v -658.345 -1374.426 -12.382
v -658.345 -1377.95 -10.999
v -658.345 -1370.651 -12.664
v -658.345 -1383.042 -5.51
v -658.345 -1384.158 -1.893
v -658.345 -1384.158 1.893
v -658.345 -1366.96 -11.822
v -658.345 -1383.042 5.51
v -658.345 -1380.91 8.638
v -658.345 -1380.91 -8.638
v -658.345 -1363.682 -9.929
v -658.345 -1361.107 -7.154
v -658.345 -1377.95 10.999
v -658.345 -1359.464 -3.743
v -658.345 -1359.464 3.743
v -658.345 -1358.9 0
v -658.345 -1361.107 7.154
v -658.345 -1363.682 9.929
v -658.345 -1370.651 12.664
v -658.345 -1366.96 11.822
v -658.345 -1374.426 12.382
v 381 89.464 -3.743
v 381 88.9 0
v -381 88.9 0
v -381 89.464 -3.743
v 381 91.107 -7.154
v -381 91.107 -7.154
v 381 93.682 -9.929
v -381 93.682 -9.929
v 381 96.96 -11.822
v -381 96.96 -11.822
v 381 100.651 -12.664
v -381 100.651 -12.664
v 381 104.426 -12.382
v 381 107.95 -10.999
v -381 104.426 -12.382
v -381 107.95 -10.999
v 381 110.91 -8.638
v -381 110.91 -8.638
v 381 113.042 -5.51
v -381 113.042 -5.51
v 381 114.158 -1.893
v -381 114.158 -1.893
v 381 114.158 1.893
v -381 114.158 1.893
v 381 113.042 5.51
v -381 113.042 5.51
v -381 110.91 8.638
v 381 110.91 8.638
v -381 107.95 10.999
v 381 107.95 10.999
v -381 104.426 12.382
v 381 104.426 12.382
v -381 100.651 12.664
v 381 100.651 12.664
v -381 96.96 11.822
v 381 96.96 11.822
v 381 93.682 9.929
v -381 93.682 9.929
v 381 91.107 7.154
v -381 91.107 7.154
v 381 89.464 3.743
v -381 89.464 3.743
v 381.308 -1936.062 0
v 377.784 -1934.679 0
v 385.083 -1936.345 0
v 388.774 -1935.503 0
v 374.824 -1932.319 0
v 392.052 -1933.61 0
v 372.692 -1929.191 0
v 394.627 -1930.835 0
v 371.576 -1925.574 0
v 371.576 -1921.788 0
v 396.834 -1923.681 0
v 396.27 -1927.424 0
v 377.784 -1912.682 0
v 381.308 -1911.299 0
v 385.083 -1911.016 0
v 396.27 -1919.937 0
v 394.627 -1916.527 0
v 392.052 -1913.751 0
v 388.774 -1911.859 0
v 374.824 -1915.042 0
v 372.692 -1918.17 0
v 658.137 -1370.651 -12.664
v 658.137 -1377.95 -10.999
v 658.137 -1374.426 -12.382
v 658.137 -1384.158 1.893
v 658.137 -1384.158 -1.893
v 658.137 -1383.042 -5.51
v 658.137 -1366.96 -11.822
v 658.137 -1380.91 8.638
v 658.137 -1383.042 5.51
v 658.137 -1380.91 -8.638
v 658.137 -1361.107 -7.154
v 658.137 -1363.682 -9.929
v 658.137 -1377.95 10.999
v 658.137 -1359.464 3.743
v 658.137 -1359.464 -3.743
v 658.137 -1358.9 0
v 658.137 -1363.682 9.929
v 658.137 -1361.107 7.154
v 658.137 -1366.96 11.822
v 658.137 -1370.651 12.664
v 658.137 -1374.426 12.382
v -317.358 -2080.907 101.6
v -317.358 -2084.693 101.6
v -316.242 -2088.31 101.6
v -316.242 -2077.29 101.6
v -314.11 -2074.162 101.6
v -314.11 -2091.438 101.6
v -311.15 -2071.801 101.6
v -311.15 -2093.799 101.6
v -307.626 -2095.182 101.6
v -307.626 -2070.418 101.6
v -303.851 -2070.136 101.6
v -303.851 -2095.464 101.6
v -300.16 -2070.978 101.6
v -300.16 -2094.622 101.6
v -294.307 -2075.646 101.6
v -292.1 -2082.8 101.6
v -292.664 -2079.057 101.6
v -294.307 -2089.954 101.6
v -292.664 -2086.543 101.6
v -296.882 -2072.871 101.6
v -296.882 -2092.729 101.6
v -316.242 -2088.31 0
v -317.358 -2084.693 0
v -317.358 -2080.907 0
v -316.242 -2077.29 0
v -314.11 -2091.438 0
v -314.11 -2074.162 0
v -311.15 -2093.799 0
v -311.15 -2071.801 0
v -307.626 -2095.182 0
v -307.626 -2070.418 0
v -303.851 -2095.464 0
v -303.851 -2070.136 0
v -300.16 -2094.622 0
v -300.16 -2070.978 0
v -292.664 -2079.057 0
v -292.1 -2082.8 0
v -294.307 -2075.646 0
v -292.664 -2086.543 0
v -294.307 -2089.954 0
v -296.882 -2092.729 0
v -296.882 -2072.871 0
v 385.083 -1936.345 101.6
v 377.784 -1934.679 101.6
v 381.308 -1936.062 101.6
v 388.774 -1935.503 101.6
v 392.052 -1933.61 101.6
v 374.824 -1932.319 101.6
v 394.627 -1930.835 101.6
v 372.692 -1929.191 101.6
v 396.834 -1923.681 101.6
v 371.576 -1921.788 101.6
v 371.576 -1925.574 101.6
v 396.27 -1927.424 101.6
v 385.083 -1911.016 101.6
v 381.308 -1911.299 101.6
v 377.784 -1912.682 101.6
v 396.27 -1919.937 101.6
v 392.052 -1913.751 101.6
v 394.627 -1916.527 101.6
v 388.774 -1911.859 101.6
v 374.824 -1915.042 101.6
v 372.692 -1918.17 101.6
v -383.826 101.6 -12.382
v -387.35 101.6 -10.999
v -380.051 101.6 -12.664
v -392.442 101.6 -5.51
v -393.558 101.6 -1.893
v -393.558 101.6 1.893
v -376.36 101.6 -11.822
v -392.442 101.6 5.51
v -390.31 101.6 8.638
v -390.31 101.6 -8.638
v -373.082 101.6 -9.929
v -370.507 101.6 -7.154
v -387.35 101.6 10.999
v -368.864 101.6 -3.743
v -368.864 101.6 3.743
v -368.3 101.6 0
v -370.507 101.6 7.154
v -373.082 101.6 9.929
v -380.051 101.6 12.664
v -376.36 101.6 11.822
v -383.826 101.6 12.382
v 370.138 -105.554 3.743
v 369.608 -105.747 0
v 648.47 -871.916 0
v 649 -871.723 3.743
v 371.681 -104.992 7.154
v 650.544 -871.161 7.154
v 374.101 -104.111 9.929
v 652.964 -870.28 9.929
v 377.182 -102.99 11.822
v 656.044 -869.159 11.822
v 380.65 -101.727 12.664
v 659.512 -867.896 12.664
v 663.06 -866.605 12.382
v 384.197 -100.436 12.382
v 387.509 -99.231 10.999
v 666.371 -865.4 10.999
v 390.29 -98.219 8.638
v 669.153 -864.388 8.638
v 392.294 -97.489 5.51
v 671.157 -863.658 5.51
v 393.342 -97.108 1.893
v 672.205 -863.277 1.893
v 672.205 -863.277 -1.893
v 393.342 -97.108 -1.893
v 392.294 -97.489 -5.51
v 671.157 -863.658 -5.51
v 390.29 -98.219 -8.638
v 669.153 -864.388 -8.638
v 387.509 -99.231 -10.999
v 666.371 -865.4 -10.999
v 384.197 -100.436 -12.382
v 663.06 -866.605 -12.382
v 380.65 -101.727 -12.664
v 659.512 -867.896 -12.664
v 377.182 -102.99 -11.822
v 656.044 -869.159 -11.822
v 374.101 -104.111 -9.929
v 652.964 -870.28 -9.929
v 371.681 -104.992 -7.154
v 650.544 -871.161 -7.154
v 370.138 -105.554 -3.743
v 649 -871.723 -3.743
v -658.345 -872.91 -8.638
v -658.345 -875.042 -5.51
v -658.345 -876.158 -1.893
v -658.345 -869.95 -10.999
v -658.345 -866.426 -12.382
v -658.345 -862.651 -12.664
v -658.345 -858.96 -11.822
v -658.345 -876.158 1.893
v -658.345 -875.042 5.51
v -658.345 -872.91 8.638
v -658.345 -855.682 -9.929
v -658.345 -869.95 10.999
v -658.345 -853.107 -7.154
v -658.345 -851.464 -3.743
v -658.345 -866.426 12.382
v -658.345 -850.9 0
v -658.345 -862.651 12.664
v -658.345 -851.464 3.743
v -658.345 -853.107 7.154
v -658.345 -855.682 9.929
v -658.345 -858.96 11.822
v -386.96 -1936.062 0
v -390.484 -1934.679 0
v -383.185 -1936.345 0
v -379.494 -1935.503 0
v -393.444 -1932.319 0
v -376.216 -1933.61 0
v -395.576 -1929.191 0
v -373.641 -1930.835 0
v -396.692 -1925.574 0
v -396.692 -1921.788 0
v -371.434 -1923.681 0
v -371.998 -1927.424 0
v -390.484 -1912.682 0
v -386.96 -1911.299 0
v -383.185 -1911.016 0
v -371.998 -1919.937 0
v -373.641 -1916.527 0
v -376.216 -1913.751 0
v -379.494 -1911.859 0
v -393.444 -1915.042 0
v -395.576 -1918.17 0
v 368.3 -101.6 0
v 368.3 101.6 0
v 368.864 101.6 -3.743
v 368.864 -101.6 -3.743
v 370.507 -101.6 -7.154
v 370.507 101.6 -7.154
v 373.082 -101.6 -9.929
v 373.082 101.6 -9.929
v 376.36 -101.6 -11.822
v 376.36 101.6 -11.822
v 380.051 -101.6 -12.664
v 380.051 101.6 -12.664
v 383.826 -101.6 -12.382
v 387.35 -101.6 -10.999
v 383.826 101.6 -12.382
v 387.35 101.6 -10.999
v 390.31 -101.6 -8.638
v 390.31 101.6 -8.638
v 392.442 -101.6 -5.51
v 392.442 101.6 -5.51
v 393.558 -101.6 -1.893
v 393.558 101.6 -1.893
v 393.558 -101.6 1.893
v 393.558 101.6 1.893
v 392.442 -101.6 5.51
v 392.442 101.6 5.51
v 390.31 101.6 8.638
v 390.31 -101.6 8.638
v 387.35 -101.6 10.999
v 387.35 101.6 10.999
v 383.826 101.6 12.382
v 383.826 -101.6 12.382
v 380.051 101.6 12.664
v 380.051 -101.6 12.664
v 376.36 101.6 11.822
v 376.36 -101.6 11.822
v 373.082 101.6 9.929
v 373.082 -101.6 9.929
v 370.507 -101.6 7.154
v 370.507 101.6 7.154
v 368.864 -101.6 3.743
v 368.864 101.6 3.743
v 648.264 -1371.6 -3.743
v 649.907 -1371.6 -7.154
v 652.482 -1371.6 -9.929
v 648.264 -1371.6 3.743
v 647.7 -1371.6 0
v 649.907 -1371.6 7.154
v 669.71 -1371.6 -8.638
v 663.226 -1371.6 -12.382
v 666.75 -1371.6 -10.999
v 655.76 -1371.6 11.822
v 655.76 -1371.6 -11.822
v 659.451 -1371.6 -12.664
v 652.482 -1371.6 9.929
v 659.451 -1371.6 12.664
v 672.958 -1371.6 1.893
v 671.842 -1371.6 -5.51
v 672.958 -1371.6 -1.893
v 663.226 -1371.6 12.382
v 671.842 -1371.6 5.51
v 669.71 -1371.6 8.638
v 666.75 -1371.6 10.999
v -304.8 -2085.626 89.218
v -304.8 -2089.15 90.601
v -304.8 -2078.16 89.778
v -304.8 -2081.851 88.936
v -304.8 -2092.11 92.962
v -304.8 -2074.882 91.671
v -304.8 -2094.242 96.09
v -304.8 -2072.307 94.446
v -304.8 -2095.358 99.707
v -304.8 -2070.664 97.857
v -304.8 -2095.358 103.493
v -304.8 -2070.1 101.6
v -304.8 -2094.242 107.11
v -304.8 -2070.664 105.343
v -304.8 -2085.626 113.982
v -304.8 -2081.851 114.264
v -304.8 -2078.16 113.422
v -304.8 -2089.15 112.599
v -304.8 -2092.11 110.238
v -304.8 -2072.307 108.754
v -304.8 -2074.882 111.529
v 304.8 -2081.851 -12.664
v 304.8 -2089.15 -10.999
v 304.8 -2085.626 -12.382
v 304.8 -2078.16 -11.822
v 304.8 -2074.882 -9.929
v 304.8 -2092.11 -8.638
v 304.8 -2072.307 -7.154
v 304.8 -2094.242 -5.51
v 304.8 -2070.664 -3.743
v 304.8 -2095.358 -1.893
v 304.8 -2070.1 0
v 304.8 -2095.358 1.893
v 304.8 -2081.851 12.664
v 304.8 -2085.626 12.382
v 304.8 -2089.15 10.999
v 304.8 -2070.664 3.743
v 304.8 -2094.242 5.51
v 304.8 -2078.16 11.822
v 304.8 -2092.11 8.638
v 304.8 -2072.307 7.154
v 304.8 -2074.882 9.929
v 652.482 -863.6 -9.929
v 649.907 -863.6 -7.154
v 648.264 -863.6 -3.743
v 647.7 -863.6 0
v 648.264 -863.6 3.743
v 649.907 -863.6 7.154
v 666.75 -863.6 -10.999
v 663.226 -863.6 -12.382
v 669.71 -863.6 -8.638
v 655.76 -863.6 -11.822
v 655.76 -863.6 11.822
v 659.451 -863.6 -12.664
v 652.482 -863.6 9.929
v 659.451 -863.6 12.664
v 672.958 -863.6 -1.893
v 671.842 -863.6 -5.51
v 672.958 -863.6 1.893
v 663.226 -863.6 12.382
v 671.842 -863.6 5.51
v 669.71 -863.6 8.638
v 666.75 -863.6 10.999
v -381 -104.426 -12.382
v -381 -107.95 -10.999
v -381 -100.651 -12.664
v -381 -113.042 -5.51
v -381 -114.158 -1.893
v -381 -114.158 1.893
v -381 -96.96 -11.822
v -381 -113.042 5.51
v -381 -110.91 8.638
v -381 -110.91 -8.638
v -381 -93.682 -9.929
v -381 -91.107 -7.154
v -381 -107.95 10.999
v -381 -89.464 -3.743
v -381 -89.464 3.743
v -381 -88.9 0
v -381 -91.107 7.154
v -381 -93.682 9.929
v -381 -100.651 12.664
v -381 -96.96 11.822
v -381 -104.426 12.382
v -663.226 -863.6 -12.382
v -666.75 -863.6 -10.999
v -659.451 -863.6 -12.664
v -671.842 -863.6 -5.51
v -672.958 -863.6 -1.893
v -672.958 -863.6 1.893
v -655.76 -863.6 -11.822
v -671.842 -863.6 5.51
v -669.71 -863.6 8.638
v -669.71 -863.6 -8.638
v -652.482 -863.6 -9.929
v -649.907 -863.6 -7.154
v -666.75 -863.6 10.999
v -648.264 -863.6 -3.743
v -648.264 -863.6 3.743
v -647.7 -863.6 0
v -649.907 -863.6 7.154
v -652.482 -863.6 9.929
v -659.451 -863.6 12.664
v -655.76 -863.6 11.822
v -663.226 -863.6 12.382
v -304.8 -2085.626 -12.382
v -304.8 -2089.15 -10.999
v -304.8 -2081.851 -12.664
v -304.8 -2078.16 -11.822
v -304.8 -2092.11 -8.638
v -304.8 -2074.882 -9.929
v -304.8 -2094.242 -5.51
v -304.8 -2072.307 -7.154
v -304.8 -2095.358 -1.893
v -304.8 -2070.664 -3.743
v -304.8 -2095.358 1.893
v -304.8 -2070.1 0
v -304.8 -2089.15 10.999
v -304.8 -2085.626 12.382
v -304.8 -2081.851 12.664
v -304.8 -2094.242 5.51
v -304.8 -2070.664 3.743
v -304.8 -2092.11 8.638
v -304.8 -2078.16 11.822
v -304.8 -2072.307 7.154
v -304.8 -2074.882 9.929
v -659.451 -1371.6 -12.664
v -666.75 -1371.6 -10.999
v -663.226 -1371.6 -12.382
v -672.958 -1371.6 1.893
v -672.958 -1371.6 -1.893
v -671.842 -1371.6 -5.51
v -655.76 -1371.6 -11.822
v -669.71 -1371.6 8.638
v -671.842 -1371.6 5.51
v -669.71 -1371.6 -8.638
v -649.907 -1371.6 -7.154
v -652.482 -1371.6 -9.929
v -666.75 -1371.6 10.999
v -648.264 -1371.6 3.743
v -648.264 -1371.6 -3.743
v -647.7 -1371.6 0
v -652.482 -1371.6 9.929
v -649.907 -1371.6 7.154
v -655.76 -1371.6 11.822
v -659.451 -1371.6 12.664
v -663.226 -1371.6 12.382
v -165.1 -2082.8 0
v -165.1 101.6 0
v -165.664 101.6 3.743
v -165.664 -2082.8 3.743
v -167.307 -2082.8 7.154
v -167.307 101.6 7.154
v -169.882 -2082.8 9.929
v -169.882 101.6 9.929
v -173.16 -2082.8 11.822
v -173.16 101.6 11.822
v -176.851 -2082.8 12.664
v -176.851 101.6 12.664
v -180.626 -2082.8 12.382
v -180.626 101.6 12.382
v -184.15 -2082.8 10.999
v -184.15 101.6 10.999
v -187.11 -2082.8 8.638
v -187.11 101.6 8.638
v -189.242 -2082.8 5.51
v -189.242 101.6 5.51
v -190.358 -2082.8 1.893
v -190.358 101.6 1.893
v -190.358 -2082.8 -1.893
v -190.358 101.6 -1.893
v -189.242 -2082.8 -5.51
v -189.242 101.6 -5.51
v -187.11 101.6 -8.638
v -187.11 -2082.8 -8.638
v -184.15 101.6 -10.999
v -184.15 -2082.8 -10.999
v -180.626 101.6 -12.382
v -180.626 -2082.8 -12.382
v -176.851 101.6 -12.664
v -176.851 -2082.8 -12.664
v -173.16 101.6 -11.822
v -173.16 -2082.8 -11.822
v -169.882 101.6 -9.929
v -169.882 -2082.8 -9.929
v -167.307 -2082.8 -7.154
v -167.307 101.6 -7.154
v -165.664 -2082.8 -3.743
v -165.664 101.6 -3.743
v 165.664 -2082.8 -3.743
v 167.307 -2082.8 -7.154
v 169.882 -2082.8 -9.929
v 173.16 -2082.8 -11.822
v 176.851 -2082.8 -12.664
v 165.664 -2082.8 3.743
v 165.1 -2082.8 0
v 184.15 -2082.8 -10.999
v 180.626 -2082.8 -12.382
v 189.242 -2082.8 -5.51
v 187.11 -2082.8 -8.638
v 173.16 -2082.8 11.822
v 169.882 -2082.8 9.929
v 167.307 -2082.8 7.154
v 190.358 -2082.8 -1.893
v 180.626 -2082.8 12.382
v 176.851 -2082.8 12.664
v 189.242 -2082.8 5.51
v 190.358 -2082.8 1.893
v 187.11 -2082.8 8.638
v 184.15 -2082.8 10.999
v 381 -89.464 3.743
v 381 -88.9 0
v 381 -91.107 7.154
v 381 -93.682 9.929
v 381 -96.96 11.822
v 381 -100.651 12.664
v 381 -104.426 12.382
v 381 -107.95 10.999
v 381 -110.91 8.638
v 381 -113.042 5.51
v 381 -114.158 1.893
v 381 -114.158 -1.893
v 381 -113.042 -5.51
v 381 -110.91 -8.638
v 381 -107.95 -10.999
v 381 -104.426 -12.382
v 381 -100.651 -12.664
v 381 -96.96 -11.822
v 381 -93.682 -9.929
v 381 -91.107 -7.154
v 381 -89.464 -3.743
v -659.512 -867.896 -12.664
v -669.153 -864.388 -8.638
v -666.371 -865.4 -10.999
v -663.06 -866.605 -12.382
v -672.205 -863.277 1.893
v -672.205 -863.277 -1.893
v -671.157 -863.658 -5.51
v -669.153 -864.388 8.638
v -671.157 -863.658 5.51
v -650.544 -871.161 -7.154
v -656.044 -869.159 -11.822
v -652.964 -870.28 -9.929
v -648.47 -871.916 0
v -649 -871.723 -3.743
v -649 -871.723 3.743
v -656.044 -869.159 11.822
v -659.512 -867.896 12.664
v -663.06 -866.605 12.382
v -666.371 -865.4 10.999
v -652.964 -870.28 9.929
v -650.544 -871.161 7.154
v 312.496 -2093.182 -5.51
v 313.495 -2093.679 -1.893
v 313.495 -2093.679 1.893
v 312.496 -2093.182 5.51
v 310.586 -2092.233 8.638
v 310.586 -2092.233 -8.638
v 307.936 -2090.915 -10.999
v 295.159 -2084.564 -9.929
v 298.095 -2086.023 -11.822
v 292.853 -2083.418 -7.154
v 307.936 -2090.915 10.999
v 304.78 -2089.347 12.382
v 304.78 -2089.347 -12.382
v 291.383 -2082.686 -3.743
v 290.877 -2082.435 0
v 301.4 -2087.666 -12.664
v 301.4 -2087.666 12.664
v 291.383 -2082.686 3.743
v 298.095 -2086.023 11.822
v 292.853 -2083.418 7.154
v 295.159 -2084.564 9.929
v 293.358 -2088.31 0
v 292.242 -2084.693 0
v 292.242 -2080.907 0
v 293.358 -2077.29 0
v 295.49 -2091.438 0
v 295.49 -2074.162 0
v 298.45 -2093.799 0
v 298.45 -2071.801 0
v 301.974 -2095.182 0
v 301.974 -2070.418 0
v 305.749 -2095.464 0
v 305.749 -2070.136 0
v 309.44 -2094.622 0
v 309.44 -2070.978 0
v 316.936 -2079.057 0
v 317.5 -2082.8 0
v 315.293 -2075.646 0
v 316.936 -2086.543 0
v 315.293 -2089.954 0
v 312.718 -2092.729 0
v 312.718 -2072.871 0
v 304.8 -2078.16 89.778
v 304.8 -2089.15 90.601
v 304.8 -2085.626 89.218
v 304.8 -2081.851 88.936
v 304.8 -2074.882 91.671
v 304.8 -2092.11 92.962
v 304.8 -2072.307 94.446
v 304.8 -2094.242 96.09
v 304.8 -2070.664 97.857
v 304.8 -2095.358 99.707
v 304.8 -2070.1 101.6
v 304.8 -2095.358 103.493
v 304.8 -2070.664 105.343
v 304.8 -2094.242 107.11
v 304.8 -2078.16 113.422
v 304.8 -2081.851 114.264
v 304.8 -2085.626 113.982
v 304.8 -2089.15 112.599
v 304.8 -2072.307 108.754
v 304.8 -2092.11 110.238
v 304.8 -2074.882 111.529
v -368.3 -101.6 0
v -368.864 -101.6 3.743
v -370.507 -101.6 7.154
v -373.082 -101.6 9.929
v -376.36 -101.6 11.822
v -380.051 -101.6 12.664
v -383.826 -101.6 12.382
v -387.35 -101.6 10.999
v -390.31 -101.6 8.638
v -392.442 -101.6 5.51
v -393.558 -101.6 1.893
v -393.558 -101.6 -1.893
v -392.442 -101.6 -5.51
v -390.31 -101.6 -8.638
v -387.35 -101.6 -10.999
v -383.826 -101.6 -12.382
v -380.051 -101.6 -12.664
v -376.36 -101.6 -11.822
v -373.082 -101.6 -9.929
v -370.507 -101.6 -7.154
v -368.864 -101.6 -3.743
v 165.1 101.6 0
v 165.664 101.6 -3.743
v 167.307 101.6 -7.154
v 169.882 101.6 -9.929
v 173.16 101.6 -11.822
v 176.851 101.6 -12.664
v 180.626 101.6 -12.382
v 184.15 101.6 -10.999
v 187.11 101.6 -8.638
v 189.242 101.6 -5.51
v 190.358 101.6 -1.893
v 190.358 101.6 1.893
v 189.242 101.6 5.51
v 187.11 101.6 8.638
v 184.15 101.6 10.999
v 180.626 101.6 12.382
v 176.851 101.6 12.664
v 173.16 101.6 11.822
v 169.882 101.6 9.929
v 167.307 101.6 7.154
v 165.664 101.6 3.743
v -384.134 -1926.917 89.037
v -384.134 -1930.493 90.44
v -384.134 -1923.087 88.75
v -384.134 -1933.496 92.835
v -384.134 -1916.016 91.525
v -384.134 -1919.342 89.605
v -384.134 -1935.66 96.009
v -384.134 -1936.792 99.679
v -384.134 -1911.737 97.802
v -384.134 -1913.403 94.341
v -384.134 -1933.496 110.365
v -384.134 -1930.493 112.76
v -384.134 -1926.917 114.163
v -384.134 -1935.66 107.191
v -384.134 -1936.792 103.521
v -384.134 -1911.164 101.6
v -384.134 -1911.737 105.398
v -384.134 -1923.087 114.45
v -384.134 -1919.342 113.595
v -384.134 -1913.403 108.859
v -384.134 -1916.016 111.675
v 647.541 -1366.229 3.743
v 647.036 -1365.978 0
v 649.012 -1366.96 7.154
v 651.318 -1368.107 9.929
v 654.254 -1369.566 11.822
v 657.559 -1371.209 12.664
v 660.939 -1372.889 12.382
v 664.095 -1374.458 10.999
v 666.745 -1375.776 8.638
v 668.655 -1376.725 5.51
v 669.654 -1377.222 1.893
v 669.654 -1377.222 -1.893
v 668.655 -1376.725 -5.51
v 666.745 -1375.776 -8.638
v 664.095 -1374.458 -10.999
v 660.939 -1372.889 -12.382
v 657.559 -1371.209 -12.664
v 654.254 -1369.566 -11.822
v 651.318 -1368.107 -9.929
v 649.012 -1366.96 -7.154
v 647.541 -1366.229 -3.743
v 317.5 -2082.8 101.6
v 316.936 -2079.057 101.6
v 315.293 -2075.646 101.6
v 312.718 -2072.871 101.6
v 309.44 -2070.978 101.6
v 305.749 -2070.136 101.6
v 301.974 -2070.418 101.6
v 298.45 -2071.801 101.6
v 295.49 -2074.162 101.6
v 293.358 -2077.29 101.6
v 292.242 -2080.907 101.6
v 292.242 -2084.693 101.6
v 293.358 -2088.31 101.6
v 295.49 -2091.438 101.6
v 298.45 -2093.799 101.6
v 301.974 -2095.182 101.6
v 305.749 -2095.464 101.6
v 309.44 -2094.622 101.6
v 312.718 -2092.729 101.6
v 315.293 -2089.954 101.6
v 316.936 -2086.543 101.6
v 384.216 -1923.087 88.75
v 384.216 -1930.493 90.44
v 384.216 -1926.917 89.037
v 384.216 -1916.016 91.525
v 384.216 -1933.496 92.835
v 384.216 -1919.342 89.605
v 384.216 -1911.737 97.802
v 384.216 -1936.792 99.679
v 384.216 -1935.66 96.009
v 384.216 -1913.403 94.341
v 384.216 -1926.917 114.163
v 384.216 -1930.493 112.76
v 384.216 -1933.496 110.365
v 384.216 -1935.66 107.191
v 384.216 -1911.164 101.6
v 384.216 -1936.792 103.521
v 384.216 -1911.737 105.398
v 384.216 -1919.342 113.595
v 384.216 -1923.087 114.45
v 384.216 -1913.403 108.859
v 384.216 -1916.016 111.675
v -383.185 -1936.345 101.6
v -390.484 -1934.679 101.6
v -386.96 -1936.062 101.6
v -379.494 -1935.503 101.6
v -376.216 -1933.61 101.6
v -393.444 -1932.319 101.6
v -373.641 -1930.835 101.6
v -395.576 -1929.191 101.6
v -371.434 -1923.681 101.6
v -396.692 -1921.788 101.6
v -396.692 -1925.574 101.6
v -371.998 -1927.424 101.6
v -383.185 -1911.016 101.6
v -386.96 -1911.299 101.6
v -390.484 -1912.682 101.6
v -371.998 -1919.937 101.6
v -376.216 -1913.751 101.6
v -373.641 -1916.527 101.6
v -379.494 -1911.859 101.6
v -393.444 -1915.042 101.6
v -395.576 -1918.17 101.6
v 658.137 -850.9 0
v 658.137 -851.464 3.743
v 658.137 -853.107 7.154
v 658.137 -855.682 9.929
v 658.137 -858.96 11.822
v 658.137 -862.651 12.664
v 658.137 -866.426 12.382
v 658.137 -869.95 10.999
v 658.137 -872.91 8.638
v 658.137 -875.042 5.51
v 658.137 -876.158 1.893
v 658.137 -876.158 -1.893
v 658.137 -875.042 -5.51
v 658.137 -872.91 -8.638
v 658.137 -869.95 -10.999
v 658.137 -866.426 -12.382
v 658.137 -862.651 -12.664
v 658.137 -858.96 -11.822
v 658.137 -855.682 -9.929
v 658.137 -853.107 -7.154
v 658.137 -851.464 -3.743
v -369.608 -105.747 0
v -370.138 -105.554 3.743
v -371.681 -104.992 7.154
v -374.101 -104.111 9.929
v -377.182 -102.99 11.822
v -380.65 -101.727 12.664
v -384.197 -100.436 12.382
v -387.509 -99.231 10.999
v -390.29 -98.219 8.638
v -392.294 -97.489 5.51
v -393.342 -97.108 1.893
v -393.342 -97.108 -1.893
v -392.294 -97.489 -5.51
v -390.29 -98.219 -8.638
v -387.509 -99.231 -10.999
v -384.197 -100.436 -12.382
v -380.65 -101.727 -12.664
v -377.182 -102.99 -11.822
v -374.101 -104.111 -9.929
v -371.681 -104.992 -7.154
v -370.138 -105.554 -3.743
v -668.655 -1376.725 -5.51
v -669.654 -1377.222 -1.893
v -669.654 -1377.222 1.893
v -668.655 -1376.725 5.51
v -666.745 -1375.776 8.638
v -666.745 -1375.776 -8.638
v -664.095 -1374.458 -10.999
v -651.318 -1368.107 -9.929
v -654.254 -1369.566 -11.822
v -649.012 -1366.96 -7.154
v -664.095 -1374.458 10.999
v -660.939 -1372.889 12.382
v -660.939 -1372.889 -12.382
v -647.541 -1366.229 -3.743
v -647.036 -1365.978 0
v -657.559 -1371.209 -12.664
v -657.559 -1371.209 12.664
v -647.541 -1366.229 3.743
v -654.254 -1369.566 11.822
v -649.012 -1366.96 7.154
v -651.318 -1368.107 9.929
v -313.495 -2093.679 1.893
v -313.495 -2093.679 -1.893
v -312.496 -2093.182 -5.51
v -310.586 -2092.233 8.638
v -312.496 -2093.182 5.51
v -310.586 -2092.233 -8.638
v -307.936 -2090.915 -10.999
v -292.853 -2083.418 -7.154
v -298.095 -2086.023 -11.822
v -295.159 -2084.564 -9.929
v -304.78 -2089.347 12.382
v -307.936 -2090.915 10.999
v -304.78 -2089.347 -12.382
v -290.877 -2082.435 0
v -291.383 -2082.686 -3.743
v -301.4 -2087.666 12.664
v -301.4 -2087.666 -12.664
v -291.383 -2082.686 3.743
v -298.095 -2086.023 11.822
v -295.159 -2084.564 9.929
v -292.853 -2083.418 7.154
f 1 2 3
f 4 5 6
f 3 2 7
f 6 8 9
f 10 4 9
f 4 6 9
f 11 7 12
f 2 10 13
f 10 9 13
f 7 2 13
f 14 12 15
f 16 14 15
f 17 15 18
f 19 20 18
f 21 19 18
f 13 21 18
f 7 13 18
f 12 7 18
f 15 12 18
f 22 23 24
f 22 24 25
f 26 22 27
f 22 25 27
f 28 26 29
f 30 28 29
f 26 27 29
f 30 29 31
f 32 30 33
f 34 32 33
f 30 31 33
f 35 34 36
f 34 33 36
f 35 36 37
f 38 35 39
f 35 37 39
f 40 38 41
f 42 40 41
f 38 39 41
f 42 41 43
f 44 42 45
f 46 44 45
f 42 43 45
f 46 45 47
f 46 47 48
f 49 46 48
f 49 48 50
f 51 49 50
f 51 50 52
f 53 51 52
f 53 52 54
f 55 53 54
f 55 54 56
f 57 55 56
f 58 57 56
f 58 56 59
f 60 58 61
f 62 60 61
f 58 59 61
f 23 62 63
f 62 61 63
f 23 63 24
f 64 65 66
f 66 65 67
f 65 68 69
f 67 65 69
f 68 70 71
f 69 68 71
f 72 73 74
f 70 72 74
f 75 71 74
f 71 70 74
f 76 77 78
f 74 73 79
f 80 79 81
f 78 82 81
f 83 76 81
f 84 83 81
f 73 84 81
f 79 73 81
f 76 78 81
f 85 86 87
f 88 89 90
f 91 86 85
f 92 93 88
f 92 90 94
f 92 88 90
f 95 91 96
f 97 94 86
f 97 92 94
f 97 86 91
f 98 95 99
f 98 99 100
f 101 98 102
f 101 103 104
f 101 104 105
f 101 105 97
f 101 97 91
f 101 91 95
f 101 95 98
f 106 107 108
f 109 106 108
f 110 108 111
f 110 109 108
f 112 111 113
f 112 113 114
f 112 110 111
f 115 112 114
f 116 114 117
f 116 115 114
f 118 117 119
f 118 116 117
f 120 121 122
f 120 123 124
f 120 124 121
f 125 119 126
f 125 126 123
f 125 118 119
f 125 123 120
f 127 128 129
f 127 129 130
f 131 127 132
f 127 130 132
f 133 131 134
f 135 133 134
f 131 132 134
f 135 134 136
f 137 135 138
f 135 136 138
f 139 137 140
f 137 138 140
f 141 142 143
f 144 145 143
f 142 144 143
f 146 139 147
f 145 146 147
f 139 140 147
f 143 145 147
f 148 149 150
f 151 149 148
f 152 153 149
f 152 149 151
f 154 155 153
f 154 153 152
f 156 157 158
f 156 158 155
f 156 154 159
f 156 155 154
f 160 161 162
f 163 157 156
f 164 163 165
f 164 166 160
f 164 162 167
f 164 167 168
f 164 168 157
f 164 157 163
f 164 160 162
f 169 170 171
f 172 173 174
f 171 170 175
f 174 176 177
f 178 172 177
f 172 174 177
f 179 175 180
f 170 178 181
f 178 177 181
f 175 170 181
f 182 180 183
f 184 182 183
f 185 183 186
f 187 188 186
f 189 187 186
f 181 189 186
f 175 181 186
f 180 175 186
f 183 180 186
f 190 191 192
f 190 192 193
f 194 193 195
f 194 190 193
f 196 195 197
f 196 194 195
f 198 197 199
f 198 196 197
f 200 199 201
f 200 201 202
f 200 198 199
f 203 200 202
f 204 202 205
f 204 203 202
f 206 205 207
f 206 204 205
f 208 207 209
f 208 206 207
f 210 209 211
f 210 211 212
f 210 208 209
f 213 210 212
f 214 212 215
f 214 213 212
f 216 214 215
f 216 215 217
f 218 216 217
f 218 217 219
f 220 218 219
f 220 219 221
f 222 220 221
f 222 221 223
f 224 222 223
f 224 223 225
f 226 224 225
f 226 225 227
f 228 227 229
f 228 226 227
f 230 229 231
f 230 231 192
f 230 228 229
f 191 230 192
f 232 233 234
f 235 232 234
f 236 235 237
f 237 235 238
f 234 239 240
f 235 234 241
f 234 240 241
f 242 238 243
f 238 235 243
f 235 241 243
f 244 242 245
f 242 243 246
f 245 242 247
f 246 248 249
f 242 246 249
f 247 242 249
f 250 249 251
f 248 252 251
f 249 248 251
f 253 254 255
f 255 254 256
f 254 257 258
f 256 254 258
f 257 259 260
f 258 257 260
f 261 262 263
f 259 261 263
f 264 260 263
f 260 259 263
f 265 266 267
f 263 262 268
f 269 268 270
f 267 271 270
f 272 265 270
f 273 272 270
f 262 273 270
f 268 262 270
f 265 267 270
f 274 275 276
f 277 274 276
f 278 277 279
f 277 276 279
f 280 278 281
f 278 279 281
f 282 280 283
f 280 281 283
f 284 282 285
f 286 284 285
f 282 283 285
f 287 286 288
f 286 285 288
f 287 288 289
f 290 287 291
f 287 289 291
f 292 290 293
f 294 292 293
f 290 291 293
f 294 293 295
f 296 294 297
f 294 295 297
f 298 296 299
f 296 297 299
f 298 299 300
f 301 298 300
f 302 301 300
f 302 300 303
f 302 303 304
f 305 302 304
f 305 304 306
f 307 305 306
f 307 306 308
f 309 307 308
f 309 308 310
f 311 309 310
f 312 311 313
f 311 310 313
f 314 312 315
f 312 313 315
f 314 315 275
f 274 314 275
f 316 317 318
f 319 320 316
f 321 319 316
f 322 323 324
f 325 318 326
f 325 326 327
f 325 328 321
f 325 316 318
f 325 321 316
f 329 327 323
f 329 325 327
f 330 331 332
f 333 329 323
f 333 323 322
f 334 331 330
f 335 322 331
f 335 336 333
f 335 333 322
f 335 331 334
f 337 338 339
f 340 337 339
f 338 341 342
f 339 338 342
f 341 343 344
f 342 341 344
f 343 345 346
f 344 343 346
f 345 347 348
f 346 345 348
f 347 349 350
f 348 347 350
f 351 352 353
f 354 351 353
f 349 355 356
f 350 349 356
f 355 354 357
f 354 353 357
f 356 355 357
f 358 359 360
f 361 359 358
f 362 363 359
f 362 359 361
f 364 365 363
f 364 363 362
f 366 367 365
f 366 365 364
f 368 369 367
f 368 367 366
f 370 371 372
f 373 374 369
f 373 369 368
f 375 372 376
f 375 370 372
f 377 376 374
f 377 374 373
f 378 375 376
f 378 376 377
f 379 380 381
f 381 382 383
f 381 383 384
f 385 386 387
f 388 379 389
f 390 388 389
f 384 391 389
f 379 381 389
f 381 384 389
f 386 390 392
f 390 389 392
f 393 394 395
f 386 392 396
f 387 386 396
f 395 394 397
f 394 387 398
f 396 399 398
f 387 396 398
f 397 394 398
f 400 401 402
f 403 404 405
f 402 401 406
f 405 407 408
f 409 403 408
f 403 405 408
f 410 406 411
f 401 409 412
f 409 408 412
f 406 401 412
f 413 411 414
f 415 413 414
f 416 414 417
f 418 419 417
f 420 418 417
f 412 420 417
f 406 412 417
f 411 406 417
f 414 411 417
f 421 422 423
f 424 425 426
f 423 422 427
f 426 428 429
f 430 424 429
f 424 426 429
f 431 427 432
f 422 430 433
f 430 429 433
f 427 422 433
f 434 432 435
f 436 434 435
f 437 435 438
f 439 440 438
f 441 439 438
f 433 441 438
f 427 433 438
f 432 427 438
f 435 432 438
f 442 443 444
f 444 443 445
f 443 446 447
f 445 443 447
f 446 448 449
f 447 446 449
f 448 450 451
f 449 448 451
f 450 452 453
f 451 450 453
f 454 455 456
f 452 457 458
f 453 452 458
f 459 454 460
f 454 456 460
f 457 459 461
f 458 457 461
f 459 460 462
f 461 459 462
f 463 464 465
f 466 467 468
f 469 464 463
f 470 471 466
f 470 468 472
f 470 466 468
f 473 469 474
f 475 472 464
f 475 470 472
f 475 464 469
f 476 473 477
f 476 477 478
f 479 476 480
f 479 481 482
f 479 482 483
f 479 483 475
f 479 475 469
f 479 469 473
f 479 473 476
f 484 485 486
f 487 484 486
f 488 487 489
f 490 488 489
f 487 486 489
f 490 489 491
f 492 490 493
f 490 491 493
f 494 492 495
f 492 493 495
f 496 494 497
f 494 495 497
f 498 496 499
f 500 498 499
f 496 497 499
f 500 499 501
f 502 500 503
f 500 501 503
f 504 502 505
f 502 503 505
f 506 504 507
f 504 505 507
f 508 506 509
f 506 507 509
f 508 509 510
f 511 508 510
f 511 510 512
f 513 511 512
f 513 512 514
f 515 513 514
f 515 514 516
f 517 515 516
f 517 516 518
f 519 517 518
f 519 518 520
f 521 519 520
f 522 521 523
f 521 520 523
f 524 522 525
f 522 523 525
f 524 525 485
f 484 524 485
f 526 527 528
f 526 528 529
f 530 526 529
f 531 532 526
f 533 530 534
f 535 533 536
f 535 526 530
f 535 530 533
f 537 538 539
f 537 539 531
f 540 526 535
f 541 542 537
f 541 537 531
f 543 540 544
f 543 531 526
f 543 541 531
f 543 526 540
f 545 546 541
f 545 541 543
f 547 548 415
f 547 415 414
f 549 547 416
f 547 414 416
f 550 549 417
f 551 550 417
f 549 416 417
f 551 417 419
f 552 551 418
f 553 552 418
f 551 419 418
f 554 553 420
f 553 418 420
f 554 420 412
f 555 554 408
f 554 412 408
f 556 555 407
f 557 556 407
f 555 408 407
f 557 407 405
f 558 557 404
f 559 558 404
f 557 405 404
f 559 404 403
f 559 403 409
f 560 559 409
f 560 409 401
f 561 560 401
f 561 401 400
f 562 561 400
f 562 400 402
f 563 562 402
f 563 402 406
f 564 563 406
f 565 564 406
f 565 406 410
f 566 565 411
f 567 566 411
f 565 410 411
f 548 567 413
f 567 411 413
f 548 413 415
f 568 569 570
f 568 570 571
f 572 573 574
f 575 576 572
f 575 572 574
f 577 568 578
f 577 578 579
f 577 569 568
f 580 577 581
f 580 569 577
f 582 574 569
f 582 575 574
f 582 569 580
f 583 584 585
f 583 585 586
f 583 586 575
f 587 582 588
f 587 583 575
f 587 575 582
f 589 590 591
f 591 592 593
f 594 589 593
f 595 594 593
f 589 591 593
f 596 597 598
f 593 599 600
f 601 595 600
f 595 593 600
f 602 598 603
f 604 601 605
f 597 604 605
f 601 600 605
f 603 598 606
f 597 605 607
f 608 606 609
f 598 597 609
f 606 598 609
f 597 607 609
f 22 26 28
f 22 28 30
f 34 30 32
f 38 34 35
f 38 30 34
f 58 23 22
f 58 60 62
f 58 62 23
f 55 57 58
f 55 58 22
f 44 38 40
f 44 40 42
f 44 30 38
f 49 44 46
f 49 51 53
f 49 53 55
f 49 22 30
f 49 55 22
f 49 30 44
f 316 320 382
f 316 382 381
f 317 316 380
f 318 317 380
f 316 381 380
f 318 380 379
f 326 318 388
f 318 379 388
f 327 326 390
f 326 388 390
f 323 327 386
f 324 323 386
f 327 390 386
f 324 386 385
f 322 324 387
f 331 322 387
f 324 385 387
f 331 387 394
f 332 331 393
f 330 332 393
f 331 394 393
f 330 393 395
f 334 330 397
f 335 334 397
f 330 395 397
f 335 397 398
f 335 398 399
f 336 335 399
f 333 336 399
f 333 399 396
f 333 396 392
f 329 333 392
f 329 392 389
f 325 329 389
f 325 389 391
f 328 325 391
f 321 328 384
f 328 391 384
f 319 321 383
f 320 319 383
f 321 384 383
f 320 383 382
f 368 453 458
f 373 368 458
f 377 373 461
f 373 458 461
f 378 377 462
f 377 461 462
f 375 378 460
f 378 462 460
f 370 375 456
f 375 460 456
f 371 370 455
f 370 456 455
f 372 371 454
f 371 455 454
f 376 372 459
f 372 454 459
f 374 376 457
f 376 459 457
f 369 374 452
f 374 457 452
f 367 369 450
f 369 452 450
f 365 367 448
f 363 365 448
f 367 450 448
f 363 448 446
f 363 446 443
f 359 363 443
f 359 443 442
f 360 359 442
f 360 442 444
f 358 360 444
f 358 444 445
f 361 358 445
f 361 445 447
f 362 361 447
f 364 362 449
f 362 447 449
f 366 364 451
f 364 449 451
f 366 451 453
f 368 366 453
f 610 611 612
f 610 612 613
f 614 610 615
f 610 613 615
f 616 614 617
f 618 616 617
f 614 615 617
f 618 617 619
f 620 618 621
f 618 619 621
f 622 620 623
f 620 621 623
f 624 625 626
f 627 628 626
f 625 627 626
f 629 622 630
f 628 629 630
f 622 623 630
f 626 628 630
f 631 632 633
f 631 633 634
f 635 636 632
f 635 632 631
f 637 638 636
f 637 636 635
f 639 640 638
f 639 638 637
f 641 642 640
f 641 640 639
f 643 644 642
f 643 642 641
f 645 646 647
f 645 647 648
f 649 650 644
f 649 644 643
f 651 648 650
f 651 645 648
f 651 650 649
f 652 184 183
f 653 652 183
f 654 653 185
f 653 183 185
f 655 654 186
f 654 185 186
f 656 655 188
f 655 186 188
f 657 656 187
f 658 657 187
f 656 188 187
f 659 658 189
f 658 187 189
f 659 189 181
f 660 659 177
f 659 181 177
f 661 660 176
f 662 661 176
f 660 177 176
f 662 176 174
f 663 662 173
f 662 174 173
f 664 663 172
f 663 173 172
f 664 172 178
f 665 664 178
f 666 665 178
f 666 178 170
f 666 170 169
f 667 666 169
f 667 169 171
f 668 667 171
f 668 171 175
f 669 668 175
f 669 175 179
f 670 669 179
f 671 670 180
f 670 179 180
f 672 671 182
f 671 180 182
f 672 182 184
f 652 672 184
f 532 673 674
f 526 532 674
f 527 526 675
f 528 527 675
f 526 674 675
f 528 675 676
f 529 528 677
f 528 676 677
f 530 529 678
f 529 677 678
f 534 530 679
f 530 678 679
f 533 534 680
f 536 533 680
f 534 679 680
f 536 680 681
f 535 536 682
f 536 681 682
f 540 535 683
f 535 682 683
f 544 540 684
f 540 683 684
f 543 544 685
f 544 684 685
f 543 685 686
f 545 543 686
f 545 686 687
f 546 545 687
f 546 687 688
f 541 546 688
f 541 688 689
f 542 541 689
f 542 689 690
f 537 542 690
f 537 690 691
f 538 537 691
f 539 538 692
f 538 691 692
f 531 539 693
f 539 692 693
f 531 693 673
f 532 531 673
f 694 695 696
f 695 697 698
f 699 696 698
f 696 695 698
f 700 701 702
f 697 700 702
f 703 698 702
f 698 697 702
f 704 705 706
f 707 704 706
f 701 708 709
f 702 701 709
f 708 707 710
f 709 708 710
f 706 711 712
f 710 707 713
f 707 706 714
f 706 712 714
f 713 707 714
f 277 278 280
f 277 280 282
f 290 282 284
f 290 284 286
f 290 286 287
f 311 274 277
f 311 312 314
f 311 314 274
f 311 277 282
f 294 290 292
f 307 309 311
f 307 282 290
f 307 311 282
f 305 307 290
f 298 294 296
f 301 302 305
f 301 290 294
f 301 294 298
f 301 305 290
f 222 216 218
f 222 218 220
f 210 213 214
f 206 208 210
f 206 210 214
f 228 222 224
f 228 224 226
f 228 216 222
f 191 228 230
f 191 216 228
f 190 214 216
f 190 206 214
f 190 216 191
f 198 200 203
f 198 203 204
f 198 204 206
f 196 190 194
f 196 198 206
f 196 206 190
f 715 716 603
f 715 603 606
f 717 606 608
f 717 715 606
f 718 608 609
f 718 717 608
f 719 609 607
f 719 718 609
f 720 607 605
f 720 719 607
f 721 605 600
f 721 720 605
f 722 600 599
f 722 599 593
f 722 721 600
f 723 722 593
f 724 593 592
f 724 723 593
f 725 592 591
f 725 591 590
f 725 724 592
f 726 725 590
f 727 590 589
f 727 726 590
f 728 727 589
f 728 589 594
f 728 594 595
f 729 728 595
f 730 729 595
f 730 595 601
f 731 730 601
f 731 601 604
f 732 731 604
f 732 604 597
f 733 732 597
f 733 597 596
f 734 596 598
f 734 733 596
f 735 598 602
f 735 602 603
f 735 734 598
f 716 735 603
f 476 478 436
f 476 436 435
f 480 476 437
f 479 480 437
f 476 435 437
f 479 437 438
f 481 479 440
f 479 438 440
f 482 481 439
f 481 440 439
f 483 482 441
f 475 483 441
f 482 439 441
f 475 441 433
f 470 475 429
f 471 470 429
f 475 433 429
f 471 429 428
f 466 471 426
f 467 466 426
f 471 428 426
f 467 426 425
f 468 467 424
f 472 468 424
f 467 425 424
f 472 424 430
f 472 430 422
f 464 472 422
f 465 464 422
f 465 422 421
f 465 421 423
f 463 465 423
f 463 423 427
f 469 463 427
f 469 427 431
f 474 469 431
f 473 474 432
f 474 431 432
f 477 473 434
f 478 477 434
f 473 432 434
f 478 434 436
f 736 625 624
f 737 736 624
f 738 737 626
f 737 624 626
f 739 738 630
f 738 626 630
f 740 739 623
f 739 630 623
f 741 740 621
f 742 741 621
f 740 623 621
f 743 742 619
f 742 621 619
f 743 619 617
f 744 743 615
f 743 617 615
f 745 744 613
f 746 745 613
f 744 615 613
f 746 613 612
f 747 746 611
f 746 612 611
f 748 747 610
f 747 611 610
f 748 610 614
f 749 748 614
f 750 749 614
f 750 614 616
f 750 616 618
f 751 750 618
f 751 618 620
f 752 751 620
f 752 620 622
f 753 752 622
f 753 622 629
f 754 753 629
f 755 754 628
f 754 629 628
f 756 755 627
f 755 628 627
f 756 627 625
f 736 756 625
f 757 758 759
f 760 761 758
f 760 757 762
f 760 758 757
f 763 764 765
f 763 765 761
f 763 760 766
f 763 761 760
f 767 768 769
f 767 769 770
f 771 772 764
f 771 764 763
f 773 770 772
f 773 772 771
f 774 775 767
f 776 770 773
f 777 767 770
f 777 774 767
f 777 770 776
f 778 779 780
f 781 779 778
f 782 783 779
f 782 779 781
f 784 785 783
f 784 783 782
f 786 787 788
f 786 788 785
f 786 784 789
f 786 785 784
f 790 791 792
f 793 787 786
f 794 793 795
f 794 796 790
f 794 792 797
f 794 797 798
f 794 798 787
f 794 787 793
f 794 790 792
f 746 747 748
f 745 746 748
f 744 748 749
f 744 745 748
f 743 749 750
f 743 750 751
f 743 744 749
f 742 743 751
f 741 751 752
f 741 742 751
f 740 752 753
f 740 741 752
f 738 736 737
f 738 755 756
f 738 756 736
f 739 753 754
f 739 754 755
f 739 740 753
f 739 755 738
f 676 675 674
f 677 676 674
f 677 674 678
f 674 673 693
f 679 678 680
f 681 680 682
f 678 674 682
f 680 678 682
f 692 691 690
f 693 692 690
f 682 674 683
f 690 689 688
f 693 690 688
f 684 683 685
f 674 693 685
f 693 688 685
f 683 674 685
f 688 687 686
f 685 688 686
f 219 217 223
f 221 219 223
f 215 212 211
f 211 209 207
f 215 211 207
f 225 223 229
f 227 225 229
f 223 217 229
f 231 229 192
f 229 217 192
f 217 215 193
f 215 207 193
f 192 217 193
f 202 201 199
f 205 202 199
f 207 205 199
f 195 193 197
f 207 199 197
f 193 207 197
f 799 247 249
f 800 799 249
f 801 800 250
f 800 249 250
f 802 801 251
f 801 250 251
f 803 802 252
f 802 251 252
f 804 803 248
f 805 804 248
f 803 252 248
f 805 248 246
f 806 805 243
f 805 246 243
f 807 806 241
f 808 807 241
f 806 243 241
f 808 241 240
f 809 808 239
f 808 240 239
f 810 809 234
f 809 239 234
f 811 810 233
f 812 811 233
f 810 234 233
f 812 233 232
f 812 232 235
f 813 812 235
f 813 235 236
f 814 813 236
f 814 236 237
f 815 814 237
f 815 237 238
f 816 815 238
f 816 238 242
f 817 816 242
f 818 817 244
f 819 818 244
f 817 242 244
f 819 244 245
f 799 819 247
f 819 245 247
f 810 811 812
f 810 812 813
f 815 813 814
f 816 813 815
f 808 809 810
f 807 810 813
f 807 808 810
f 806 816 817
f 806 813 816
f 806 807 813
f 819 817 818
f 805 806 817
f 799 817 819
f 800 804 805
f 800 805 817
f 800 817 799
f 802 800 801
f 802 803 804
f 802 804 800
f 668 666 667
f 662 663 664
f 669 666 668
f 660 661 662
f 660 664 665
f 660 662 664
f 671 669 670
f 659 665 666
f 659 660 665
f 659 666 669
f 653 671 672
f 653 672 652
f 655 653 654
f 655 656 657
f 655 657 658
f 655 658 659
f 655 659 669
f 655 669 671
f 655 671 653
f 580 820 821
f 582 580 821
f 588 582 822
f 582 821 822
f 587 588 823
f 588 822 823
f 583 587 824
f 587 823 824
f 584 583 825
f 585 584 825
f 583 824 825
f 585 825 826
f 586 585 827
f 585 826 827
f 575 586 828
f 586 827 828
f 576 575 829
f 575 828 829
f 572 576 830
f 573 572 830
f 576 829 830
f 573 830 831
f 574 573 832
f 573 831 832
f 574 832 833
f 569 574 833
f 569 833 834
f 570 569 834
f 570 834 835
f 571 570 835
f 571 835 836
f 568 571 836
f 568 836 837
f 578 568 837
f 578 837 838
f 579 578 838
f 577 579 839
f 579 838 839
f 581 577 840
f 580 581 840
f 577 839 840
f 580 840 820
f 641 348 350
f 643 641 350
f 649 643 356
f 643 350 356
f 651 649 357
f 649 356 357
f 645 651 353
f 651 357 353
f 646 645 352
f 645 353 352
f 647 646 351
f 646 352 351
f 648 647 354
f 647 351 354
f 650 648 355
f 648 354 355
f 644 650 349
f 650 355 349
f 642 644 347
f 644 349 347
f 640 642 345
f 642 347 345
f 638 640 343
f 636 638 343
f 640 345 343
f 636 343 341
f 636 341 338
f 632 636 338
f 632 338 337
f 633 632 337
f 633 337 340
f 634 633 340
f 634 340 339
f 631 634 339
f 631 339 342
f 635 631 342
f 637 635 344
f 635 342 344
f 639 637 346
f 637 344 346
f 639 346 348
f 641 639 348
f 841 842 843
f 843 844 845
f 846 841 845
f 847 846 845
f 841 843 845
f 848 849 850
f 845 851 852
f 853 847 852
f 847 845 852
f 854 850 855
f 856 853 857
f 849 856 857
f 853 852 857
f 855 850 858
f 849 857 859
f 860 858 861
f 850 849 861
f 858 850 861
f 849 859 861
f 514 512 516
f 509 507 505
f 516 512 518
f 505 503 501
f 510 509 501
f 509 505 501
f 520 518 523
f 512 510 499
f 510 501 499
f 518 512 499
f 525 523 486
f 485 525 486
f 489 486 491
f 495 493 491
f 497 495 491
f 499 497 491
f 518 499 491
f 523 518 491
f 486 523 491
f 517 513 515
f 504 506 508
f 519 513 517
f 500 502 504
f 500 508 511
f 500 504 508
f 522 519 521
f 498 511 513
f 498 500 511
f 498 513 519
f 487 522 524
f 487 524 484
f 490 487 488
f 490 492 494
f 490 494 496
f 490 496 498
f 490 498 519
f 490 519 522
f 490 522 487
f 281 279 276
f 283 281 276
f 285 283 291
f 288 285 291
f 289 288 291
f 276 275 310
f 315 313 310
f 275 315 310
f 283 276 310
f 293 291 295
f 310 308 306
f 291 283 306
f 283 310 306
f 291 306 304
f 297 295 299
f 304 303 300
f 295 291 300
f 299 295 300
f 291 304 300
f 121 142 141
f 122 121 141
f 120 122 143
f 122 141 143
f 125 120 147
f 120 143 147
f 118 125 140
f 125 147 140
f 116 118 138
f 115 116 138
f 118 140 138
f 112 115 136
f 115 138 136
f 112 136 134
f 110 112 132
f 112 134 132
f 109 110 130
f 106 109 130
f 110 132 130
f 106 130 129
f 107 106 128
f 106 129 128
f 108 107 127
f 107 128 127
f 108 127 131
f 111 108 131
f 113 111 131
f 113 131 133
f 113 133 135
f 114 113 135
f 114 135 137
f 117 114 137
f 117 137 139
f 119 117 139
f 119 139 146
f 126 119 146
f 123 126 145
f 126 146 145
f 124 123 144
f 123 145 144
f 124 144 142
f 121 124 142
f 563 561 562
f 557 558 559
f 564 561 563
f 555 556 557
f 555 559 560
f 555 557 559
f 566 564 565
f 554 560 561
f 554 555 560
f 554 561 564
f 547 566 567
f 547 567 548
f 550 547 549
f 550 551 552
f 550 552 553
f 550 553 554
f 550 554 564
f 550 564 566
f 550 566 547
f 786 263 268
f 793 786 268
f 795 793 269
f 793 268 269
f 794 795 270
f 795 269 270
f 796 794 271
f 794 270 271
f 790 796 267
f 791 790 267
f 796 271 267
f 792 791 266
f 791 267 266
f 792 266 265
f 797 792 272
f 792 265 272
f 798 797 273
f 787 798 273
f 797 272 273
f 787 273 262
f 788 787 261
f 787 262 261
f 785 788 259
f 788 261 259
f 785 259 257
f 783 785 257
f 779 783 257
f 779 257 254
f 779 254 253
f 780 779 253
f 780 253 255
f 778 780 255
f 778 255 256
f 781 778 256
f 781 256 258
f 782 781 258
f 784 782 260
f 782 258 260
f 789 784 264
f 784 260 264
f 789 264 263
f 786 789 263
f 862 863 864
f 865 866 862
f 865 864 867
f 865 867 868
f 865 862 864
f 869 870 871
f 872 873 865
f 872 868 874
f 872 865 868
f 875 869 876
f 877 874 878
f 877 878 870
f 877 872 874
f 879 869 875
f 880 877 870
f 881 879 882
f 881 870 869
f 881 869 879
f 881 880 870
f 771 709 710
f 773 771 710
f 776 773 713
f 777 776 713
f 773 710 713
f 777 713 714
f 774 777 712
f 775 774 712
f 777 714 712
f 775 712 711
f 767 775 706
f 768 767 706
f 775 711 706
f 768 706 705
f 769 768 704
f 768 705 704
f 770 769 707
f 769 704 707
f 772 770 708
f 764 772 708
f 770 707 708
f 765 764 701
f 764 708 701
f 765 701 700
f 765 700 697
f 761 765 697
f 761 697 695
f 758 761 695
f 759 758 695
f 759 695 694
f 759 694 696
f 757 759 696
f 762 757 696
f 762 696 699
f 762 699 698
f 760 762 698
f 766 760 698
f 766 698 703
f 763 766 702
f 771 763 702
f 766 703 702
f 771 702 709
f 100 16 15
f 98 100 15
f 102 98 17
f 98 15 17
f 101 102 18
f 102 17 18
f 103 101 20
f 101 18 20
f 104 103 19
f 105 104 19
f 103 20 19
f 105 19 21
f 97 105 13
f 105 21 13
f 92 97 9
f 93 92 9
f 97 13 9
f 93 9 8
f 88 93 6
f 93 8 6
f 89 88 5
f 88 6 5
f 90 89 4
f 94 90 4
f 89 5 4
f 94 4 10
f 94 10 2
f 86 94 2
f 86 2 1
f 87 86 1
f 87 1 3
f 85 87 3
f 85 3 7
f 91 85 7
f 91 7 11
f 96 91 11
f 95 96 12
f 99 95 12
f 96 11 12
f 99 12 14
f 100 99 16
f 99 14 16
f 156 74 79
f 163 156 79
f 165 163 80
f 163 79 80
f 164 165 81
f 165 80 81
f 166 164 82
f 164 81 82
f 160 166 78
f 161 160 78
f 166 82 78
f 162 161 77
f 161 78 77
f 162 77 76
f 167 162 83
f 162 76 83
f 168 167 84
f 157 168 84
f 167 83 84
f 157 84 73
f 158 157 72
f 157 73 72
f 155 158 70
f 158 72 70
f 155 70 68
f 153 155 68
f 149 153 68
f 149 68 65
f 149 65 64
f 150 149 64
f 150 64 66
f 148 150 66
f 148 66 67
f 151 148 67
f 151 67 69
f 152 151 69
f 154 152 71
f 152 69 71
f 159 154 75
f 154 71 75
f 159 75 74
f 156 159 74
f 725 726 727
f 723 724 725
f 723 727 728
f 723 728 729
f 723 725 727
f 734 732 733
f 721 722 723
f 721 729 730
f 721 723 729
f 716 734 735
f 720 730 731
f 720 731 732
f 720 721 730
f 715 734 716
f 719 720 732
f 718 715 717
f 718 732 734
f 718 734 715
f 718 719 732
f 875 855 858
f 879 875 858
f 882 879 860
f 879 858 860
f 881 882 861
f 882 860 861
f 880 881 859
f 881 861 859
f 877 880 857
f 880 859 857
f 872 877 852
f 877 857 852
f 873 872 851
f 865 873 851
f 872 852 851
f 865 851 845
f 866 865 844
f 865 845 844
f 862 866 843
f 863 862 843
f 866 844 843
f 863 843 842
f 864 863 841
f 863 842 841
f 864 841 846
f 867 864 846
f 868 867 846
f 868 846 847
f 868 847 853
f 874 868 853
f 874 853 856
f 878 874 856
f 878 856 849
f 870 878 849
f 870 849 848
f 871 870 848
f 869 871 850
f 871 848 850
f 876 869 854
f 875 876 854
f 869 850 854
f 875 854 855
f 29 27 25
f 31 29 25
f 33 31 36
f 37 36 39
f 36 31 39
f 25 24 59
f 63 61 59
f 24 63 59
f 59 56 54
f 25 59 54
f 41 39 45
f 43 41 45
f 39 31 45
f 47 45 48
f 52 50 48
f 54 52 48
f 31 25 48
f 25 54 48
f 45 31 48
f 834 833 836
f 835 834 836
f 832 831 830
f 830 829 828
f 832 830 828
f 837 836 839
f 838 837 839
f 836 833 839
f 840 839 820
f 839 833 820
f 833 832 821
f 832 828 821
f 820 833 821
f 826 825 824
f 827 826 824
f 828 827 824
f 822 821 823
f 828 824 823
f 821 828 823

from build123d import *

# Parameters (mm, degrees)
F3_DEPTH  = 762
F2_R      = 12.7
F6_DEPTH  = 1316.482
F5_R      = 12.7
F8_R      = 12.7
F9_DEPTH  = 609.6
F12_R     = 12.7
F13_DEPTH = 2184.4
F15_DEPTH = 203.2
F14_R     = 12.7
F18_DEPTH = 508
F17_R     = 12.7
F20_R     = 12.7
F21_DEPTH = 815.34
F23_R     = 12.7
F24_DEPTH = 815.34
F26_R     = 12.7
F27_DEPTH = 800.1
F29_R     = 12.7
F30_DEPTH = 800.1
F31_R     = 12.7
F32_DEPTH = 101.6
F34_R     = 12.7
F35_DEPTH = 609.6
F37_R     = 12.8859667662
F38_DEPTH = 768.35


with BuildPart() as f3:
    # F2 (on plane+point) → F3 (new body)
    with BuildSketch(Plane.YZ.offset(-381)):
        with BuildLine():
            ThreePointArc((114.3, 0), (101.6, 12.7), (88.9, 0))
            ThreePointArc((88.9, 0), (101.6, -12.7), (114.3, 0))
        make_face()
    extrude(amount=F3_DEPTH)


with BuildPart() as f3b:
    # F2 (on plane+point) → F3, piece 2 (new body)
    with BuildSketch(Plane.YZ.offset(-381)):
        with Locations((-101.6, 0)):
            Circle(F2_R)
    extrude(amount=F3_DEPTH)


with BuildPart() as f6:
    # F5 (on plane+point) → F6 (new body)
    with BuildSketch(Plane.YZ.offset(-658.3453185108)):
        with BuildLine():
            ThreePointArc((-876.3, 0), (-863.6, -12.7), (-850.9, 0))
            Line((-850.9, 0), (-863.6, 0))
            Line((-863.6, 0), (-876.3, 0))
        make_face()
        with BuildLine():
            Line((-863.6, 0), (-850.9, 0))
            ThreePointArc((-850.9, 0), (-863.6, 12.7), (-876.3, 0))
            Line((-876.3, 0), (-863.6, 0))
        make_face()
    extrude(amount=F6_DEPTH)


with BuildPart() as f6b:
    # F5 (on plane+point) → F6, piece 2 (new body)
    with BuildSketch(Plane.YZ.offset(-658.3453185108)):
        with Locations((-1371.6, 0)):
            Circle(F5_R)
    extrude(amount=F6_DEPTH)


with BuildPart() as f9:
    # F8 (on plane+point) → F9 (new body)
    with BuildSketch(Plane.YZ.offset(-304.8)):
        with Locations((-2082.8, 0)):
            Circle(F8_R)
    extrude(amount=F9_DEPTH)


with BuildPart() as f13:
    # F12 (on plane+point) → F13 (new body)
    with BuildSketch(Plane.XZ.offset(-101.6)):
        with Locations((-177.8, 0)):
            Circle(F12_R)
    extrude(amount=F13_DEPTH)


with BuildPart() as f13b:
    # F12 (on plane+point) → F13, piece 2 (new body)
    with BuildSketch(Plane.XZ.offset(-101.6)):
        with BuildLine():
            ThreePointArc((190.5, 0), (177.8, 12.7), (165.1, 0))
            ThreePointArc((165.1, 0), (177.8, -12.7), (190.5, 0))
        make_face()
    extrude(amount=F13_DEPTH)


with BuildPart() as f15:
    # F14 (on plane+point) → F15 (new body)
    with BuildSketch(Plane.XZ.offset(-101.6)):
        with BuildLine():
            ThreePointArc((393.7, 0), (381, 12.7), (368.3, 0))
            ThreePointArc((368.3, 0), (381, -12.7), (393.7, 0))
        make_face()
    extrude(amount=F15_DEPTH)


with BuildPart() as f15b:
    # F14 (on plane+point) → F15, piece 2 (new body)
    with BuildSketch(Plane.XZ.offset(-101.6)):
        with Locations((-381, 0)):
            Circle(F14_R)
    extrude(amount=F15_DEPTH)


with BuildPart() as f18:
    # F17 (on plane+point) → F18 (new body)
    with BuildSketch(Plane.XZ.offset(863.6)):
        with BuildLine():
            ThreePointArc((673.1, 0), (660.4, 12.7), (647.7, 0))
            ThreePointArc((647.7, 0), (660.4, -12.7), (673.1, 0))
        make_face()
    extrude(amount=F18_DEPTH)


with BuildPart() as f18b:
    # F17 (on plane+point) → F18, piece 2 (new body)
    with BuildSketch(Plane.XZ.offset(863.6)):
        with Locations((-660.4, 0)):
            Circle(F17_R)
    extrude(amount=F18_DEPTH)


with BuildPart() as f21:
    # F20 (on line) → F21 (new body)
    with BuildSketch(Plane(origin=(77.2221441579, -212.1660973557, 0), x_dir=(-0.9396926208, -0.3420201433, 0), z_dir=(-0.3420201433, 0.9396926208, 0))):
        with Locations((-323.85, 0)):
            Circle(F20_R)
    extrude(amount=-F21_DEPTH)


with BuildPart() as f24:
    # F23 (on line) → F24 (new body)
    with BuildSketch(Plane(origin=(-77.2221441579, -212.1660973557, 0), x_dir=(0.9396926208, -0.3420201433, 0), z_dir=(-0.3420201433, -0.9396926208, 0))):
        with Locations((-323.85, 0)):
            Circle(F23_R)
    extrude(amount=F24_DEPTH)


with BuildPart() as f27:
    # F26 (on line) → F27 (new body)
    with BuildSketch(Plane(origin=(-416.2773786186, -837.3932737126, 0), x_dir=(-0.8954596021, 0.4451427872, 0), z_dir=(0.4451427872, 0.8954596021, 0))):
        with Locations((-1200.15, 0)):
            Circle(F26_R)
    extrude(amount=-F27_DEPTH)


with BuildPart() as f30:
    # F29 (on line) → F30 (new body)
    with BuildSketch(Plane(origin=(416.2773786186, -837.3932737126, 0), x_dir=(0.8954596021, 0.4451427872, 0), z_dir=(0.4451427872, -0.8954596021, 0))):
        with Locations((-1200.15, 0)):
            Circle(F29_R)
    extrude(amount=F30_DEPTH)


with BuildPart() as f32:
    # F31 (on Top) → F32 (new body)
    with BuildSketch(Plane.XY):
        with Locations((-304.8, -2082.8)):
            Circle(F31_R)
    extrude(amount=F32_DEPTH)


with BuildPart() as f32b:
    # F31 (on Top) → F32, piece 2 (new body)
    with BuildSketch(Plane.XY):
        with Locations((304.8, -2082.8)):
            Circle(F31_R)
    extrude(amount=F32_DEPTH)


with BuildPart() as f32c:
    # F31 (on Top) → F32, piece 3 (new body)
    with BuildSketch(Plane.XY):
        with Locations((-384.1339711709, -1923.6806705072)):
            Circle(F31_R)
    extrude(amount=F32_DEPTH)


with BuildPart() as f32d:
    # F31 (on Top) → F32, piece 4 (new body)
    with BuildSketch(Plane.XY):
        with Locations((384.1339711709, -1923.6806705072)):
            Circle(F31_R)
    extrude(amount=F32_DEPTH)


with BuildPart() as f35:
    # F34 (on face) → F35 (new body)
    with BuildSketch(Plane.YZ.offset(-304.8)):
        with Locations((-2082.8, 101.6)):
            Circle(F34_R)
    extrude(amount=F35_DEPTH)


with BuildPart() as f38:
    # F37 (on face) → F38 (new body)
    with BuildSketch(Plane.YZ.offset(-384.1339711709)):
        with Locations((-1924.05, 101.6)):
            Circle(F37_R)
    extrude(amount=F38_DEPTH)


solid = Compound([f3.part, f3b.part, f6.part, f6b.part, f9.part, f13.part, f13b.part, f15.part, f15b.part, f18.part, f18b.part, f21.part, f24.part, f27.part, f30.part, f32.part, f32b.part, f32c.part, f32d.part, f35.part, f38.part])
